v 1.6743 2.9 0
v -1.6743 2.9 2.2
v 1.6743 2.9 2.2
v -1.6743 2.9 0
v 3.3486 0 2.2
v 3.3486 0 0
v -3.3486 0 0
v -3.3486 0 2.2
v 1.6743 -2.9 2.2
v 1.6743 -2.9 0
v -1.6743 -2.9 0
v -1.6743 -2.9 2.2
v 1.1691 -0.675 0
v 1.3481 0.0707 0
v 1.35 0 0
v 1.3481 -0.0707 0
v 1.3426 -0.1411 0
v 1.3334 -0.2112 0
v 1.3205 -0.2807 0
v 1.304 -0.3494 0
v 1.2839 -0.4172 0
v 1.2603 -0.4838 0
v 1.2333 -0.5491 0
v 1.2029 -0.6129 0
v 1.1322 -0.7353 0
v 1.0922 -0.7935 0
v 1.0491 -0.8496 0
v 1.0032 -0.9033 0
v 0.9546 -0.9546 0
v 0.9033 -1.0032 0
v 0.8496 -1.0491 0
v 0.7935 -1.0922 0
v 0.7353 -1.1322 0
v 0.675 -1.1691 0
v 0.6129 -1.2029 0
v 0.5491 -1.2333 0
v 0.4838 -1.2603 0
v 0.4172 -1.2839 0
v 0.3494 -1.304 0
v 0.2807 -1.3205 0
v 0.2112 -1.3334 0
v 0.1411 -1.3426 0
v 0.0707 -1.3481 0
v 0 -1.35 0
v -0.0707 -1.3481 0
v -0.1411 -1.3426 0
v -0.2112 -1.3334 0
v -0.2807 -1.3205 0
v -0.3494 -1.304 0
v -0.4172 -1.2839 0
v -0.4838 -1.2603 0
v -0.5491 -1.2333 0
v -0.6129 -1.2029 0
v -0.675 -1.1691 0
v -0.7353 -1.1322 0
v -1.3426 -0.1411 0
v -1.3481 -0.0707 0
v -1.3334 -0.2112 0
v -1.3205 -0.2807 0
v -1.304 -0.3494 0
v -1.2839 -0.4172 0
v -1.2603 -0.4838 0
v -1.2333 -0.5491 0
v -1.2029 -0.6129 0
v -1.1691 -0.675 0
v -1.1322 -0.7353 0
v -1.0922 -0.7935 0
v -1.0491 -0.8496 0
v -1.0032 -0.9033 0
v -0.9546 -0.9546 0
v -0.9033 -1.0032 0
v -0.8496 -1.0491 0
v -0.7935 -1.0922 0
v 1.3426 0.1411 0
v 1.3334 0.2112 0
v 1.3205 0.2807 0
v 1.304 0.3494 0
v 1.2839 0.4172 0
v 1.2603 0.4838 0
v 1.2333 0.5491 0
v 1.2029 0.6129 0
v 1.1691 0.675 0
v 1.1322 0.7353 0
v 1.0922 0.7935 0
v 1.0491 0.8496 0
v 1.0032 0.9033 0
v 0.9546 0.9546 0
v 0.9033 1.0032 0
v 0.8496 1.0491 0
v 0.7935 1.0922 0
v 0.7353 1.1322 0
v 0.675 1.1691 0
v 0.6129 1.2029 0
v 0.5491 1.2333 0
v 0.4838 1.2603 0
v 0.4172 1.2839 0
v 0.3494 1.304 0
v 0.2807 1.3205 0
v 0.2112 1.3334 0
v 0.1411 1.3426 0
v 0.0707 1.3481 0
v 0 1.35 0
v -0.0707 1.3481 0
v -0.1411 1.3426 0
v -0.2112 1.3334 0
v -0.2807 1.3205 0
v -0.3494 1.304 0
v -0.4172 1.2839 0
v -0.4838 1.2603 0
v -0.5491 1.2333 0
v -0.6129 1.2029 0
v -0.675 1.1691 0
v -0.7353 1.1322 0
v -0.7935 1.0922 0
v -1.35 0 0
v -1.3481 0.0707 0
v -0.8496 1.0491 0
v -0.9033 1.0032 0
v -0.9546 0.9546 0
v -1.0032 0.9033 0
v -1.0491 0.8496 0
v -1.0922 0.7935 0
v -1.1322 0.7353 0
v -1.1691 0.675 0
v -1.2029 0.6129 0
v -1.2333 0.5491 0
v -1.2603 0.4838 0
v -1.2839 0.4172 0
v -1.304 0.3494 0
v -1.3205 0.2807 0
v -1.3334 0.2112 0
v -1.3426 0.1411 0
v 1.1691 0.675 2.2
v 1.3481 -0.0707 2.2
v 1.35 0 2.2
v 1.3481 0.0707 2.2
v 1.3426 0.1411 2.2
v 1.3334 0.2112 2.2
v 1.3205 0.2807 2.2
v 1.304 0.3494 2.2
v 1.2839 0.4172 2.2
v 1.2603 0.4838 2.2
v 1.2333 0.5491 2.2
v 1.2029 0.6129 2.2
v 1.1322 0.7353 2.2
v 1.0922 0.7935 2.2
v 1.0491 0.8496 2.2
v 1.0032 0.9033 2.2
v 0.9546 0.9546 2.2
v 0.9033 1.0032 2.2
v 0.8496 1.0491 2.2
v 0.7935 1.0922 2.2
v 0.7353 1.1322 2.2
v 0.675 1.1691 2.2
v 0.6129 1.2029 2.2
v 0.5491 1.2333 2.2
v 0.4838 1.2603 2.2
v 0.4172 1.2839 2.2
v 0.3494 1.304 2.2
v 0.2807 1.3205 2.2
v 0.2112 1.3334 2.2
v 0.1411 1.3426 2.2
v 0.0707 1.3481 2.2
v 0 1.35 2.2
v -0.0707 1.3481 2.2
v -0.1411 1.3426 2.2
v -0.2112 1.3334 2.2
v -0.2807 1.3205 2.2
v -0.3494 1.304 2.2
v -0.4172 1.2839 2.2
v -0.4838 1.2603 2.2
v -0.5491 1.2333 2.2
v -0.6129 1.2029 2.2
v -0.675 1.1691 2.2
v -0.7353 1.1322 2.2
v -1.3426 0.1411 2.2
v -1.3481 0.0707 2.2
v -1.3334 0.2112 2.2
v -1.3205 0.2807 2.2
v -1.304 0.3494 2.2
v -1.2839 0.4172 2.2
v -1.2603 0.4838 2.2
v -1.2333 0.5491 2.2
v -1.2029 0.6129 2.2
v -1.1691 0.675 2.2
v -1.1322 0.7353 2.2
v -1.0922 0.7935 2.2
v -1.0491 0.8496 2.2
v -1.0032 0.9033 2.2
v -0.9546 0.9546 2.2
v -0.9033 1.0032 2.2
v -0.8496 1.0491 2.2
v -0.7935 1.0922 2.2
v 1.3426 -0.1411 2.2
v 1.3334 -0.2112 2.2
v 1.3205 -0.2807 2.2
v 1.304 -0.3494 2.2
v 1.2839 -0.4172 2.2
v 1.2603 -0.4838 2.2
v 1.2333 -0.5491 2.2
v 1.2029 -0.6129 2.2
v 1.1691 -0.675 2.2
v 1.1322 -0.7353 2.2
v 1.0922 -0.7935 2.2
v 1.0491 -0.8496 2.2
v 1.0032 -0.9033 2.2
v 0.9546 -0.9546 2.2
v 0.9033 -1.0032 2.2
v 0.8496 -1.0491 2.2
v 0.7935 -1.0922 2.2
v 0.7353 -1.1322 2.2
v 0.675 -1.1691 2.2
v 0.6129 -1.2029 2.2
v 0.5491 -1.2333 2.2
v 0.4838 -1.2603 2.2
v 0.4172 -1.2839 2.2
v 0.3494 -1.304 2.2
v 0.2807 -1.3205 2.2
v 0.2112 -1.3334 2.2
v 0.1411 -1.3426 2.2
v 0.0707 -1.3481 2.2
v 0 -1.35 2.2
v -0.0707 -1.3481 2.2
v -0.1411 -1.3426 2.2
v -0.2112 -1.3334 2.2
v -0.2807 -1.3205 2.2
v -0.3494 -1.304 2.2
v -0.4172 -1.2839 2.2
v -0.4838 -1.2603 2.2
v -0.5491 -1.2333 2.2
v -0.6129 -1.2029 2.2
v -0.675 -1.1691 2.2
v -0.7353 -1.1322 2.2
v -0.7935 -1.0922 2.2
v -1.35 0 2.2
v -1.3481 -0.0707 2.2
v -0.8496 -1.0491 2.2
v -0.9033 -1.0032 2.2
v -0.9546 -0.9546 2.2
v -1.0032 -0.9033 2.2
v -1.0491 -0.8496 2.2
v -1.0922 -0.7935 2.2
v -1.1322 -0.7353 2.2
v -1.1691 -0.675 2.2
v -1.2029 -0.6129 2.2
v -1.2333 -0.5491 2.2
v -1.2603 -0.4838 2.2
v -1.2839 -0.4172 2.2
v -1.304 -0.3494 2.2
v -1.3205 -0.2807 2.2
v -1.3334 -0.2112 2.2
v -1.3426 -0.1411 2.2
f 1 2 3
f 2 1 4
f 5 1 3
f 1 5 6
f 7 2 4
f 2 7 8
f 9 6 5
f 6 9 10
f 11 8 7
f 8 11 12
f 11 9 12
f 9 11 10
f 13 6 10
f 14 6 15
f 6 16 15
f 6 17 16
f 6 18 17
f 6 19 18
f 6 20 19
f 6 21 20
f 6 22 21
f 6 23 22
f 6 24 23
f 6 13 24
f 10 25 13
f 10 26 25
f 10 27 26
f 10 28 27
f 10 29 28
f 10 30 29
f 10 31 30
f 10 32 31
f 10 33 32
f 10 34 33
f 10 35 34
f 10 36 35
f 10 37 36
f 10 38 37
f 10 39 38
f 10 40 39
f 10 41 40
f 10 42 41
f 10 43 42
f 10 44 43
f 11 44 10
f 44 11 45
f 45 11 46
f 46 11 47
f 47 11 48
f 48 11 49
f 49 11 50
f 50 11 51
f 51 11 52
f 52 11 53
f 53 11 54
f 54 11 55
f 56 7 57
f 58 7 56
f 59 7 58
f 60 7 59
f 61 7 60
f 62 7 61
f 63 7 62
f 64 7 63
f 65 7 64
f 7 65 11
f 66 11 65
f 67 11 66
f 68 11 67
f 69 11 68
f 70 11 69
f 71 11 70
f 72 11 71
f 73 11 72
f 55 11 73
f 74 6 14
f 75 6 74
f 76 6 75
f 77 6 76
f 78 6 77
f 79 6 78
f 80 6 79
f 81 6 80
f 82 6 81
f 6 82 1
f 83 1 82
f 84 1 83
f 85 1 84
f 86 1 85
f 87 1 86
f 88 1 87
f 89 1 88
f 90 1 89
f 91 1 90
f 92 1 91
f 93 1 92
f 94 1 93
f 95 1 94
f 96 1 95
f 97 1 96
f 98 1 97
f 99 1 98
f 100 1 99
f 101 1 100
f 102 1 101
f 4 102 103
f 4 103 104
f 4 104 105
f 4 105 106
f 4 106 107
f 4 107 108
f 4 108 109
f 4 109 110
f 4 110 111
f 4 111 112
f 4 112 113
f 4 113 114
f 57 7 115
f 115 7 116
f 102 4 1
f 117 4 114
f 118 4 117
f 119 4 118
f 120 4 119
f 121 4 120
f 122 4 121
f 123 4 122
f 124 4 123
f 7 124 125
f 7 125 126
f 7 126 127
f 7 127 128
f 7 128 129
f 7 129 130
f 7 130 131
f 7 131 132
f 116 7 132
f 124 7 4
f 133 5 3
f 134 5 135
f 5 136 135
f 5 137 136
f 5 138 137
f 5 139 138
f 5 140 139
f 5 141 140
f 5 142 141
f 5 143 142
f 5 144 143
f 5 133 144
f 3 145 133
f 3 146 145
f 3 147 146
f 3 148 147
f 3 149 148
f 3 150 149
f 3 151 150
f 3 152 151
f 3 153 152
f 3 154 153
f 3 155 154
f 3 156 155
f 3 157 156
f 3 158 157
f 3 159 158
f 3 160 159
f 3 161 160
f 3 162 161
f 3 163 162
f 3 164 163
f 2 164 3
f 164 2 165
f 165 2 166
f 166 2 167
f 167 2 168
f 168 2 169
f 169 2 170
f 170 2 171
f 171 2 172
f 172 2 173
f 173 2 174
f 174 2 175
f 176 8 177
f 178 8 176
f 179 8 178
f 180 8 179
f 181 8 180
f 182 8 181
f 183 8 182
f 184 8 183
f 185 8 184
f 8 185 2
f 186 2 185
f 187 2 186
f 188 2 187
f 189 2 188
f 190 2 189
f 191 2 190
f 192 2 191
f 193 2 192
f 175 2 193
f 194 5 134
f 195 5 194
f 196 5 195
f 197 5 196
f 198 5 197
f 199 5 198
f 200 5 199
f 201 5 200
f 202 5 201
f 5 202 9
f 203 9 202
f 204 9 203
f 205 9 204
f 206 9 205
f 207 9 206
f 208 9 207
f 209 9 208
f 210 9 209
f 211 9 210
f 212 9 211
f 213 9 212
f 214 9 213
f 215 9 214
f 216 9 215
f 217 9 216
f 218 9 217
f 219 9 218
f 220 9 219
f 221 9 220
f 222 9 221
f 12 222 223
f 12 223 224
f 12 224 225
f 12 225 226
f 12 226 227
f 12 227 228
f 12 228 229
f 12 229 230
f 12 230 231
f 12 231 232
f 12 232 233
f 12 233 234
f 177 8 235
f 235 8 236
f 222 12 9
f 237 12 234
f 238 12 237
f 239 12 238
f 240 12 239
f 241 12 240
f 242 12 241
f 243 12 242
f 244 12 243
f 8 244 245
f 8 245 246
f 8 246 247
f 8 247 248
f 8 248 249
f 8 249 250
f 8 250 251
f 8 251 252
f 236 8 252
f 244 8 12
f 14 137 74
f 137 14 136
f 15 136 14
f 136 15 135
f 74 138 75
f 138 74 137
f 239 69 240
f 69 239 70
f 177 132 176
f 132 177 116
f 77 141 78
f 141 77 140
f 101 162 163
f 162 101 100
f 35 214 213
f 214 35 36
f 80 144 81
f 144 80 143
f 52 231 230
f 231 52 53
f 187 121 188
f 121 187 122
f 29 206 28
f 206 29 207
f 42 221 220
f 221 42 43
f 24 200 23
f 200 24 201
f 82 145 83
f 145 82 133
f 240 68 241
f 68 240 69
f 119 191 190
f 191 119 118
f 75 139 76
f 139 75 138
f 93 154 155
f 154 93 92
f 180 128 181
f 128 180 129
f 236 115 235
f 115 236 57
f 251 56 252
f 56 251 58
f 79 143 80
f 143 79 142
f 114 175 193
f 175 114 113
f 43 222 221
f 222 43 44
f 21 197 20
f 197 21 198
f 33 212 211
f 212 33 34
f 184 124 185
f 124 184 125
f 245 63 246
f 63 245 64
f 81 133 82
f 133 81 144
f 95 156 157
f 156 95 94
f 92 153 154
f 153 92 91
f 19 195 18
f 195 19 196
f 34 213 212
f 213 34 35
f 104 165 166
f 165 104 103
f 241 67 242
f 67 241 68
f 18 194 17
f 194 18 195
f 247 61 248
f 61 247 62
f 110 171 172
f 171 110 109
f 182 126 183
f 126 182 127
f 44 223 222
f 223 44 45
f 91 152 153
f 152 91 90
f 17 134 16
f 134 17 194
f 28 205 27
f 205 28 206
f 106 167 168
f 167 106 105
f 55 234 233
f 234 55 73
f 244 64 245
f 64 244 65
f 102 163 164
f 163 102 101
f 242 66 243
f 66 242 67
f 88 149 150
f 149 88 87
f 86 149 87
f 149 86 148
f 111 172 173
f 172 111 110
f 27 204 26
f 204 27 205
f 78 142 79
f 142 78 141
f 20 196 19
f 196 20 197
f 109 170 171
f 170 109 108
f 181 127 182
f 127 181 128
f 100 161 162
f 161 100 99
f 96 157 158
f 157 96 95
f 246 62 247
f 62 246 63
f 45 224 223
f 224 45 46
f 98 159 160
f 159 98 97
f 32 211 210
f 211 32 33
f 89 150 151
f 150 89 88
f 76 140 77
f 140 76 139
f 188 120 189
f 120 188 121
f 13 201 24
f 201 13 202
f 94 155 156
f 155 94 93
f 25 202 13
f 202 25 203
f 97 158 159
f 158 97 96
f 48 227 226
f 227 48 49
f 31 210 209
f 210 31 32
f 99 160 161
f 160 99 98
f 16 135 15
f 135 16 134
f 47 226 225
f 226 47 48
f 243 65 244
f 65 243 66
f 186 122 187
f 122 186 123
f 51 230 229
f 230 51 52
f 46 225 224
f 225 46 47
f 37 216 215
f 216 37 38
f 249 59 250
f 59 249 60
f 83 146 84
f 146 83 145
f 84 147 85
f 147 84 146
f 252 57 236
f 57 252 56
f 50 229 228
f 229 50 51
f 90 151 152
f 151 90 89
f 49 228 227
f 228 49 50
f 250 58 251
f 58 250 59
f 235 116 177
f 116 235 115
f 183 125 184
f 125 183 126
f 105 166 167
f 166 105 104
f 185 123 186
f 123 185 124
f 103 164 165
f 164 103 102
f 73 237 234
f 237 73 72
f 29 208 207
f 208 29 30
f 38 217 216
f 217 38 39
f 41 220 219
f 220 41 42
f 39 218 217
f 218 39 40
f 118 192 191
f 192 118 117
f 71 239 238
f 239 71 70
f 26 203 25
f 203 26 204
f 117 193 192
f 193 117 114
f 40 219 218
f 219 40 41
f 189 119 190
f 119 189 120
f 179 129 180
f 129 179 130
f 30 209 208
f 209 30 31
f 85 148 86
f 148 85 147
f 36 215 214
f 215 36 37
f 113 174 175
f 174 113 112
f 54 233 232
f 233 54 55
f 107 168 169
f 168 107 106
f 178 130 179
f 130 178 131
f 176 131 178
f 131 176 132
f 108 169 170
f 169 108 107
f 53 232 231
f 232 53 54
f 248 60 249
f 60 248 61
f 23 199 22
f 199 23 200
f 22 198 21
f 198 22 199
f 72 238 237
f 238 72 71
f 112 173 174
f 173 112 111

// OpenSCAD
$fn = 120;

across_flats = 5.8;   // mm
thickness    = 2.2;   // mm
hole_d       = 2.7;   // mm (clearance for M2.5 screw)

module hex_prism_af(af, h) {
    // For a regular hexagon: across_flats = 2 * apothem
    // Circumradius R = apothem / cos(30°) = (af/2) / cos(30°)
    R = (af/2) / cos(30);
    linear_extrude(height = h)
        polygon(points = [ for (i = [0:5]) [ R*cos(60*i), R*sin(60*i) ] ]);
}

difference() {
    hex_prism_af(across_flats, thickness);
    translate([0,0,-0.2]) cylinder(d = hole_d, h = thickness + 0.4);
}
